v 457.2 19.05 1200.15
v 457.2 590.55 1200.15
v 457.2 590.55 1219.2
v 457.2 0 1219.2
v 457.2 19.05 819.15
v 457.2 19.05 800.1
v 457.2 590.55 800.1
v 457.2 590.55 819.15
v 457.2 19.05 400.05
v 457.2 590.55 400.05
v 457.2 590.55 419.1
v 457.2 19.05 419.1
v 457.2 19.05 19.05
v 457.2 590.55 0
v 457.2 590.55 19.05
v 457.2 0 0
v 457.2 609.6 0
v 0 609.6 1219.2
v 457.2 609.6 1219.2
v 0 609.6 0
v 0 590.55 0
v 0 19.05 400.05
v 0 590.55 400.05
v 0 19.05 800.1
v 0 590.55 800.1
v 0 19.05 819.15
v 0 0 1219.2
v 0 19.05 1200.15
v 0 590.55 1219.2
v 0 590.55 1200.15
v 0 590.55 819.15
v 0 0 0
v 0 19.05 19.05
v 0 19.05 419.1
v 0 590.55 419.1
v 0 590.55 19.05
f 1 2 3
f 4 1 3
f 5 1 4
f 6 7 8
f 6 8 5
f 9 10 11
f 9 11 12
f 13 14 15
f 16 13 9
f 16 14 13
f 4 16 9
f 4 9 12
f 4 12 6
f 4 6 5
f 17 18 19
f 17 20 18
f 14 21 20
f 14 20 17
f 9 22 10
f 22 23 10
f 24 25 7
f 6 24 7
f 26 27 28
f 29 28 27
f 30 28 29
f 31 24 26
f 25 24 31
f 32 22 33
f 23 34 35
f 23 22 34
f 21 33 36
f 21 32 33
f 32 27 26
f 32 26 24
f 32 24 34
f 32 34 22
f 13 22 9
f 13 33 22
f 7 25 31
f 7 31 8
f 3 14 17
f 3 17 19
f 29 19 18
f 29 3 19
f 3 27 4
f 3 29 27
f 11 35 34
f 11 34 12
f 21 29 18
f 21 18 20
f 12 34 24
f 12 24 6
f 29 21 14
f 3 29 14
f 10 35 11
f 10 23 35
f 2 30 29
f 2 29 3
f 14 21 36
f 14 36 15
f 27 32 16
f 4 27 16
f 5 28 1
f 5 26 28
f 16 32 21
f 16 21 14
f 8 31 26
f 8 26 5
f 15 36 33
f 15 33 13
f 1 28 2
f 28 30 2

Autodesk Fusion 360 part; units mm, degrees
sketch "Sketch1" plane through (0, 0, 0) normal (0, 1, 0) x (1, 0, 0)
  line L0 (0, 0) -> (457.2, 0)
  line L1 (457.2, 0) -> (457.2, -1219.2)
  line L2 (457.2, -1219.2) -> (0, -1219.2)
  line L3 (0, -1219.2) -> (0, 0)
  dimension "d4" = 457.2
  dimension "d5" = 1219.2
extrude "Extrude1" add sketch "Sketch1" along normal blind 19.05 makes body 1
pattern_linear "R-Pattern1" count 2 spacing 590.55 along (0, 1, 0) of bodies 1 makes body 2
sketch "Sketch2" plane through (0, 0, 0) normal (0, 0, 1) x (1, 0, 0)
  line L0 (0, 0) -> (457.2, 0)
  line L1 (0, 0) -> (0, 19.05)
  dimension "d12" = 457.2
  dimension "d14" = 19.05
sketch "Sketch3" plane through (0, 0, 0) normal (0, 0, 1) x (1, 0, 0)
sketch "Sketch4" plane through (0, 0, 0) normal (0, 0, 1) x (1, 0, 0)
  line L0 (457.2, 19.05) -> (0, 19.05)
  line L1 (0, 19.05) -> (0, 590.55)
  line L2 (0, 590.55) -> (457.2, 590.55)
  line L3 (457.2, 590.55) -> (457.2, 19.05)
extrude "Extrude2" add sketch "Sketch4" along normal blind 19.05 bodies 1
pattern_linear "R-Pattern2" count 4 spacing 400.05 along (0, 0, 1) of "Extrude2"
equation "shelfHeight = 48 in"
equation "ShelfDepths = 18 in"
equation "ShelfThickness = ( 3 / 4 ) * 1 in"
equation "d4 = ShelfDepths"
equation "d5 = shelfHeight"
equation "d6 = ShelfThickness"
equation "d10 = ShelfWidths - ShelfThickness"
equation "d12 = ShelfDepths"
equation "d14 = ShelfThickness"
equation "ShelfWidths = 24 in"
equation "d17 = ShelfThickness"
equation "d21 = -shelfHeight + ShelfThickness"
